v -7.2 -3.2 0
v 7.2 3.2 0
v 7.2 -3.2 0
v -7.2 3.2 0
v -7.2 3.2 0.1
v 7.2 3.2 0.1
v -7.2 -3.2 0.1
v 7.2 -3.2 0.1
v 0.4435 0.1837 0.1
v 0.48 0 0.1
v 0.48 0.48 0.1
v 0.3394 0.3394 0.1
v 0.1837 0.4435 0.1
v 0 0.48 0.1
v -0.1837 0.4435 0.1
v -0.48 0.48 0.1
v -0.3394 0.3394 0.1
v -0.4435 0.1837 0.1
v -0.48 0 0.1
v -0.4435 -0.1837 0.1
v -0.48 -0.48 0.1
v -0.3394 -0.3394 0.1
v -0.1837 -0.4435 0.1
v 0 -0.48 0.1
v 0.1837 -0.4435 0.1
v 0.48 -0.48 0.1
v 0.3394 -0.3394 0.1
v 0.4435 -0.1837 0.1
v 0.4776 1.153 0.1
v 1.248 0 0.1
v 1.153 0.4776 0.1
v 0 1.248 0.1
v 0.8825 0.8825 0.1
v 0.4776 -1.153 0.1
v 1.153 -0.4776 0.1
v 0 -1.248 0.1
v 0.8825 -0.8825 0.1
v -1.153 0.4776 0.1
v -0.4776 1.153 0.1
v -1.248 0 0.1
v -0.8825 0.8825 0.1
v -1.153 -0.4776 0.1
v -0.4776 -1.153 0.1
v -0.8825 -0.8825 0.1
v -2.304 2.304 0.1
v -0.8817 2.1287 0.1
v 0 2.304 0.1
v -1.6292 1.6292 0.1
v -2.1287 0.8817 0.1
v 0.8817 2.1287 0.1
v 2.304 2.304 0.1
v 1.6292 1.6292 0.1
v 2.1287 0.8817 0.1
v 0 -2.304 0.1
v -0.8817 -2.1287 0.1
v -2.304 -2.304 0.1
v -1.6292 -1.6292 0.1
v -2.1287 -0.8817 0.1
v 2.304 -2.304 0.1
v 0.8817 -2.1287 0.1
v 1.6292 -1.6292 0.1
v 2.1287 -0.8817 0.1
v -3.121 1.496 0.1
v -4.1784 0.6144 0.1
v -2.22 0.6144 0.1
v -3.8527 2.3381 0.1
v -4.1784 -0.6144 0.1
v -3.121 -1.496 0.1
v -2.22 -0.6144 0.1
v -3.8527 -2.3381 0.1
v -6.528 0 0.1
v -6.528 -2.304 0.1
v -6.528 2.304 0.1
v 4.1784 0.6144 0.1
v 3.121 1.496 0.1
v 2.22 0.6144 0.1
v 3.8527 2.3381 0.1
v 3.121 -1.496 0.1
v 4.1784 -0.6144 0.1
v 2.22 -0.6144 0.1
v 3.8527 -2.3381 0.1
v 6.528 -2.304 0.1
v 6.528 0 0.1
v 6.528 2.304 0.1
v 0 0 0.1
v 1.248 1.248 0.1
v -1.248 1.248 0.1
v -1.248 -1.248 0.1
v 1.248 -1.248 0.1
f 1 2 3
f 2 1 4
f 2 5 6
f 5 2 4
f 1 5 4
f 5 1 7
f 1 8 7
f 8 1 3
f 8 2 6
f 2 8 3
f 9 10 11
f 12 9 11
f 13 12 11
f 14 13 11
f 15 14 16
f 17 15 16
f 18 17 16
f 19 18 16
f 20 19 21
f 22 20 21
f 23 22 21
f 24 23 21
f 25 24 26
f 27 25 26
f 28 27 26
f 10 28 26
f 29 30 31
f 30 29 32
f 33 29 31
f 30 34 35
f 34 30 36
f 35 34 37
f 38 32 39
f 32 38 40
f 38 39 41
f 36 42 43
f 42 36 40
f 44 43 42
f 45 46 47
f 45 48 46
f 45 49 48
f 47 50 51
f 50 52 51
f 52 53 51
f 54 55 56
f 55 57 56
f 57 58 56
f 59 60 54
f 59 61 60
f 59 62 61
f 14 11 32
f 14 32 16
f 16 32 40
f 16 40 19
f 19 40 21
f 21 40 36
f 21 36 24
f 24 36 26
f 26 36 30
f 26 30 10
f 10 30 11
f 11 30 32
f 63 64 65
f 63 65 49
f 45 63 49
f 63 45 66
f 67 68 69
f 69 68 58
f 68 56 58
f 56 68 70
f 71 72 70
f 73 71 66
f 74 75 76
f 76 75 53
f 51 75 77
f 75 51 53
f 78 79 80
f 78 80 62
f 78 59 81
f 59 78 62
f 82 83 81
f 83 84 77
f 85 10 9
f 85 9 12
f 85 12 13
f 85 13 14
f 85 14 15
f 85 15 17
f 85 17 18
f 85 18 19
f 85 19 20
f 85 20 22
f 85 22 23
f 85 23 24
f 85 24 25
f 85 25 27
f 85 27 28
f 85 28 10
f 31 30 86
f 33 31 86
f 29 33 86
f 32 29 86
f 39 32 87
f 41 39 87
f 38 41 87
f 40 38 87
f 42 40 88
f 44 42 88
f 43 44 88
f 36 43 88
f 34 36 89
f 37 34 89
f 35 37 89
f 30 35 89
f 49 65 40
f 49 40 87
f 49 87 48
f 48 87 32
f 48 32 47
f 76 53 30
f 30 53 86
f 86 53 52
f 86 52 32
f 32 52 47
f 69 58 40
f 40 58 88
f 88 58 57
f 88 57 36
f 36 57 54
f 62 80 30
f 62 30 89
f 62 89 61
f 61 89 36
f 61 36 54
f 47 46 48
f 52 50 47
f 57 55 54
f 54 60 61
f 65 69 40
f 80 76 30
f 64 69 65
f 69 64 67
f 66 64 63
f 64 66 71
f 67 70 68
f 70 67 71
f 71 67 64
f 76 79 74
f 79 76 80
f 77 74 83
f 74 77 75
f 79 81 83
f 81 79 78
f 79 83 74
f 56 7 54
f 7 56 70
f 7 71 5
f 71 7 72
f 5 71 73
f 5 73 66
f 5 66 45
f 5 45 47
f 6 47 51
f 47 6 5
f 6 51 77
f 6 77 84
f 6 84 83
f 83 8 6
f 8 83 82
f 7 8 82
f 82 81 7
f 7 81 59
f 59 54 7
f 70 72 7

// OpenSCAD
// file: ../p/4-4disc.scad
use <../lib.scad>
function ldraw_lib__4_4disc() = [
// 0 Disc 1.0
// 0 Name: 4-4disc.dat
// 0 Author: James Jessiman
// 0 !LDRAW_ORG Primitive UPDATE 2002-02
// 0 !LICENSE Licensed under CC BY 4.0 : see CAreadme.txt
// 
// 0 BFC CERTIFY CCW
  [0,"BFC","CERTIFY"],
  [0,"BFC","CCW"],
// 
// 0 !HISTORY 1998-12-15 [PTadmin] Official Update 1998-10
// 0 !HISTORY 2002-03-23 [sbliss] Added BFC statement
// 0 !HISTORY 2002-04-25 [PTadmin] Official Update 2002-02
// 0 !HISTORY 2007-06-24 [PTadmin] Header formatted for Contributor Agreement
// 0 !HISTORY 2008-07-01 [PTadmin] Official Update 2008-01
// 
// 
// 3 16 0 0 0 1 0 0 0.9239 0 0.3827
  [3,16,0,0,0,1,0,0,0.9239,0,0.3827],
// 3 16 0 0 0 0.9239 0 0.3827 0.7071 0 0.7071
  [3,16,0,0,0,0.9239,0,0.3827,0.7071,0,0.7071],
// 3 16 0 0 0 0.7071 0 0.7071 0.3827 0 0.9239
  [3,16,0,0,0,0.7071,0,0.7071,0.3827,0,0.9239],
// 3 16 0 0 0 0.3827 0 0.9239 0 0 1
  [3,16,0,0,0,0.3827,0,0.9239,0,0,1],
// 3 16 0 0 0 0 0 1 -0.3827 0 0.9239
  [3,16,0,0,0,0,0,1,-0.3827,0,0.9239],
// 3 16 0 0 0 -0.3827 0 0.9239 -0.7071 0 0.7071
  [3,16,0,0,0,-0.3827,0,0.9239,-0.7071,0,0.7071],
// 3 16 0 0 0 -0.7071 0 0.7071 -0.9239 0 0.3827
  [3,16,0,0,0,-0.7071,0,0.7071,-0.9239,0,0.3827],
// 3 16 0 0 0 -0.9239 0 0.3827 -1 0 -0
  [3,16,0,0,0,-0.9239,0,0.3827,-1,0,-0],
// 3 16 0 0 0 -1 0 -0 -0.9239 0 -0.3827
  [3,16,0,0,0,-1,0,-0,-0.9239,0,-0.3827],
// 3 16 0 0 0 -0.9239 0 -0.3827 -0.7071 0 -0.7071
  [3,16,0,0,0,-0.9239,0,-0.3827,-0.7071,0,-0.7071],
// 3 16 0 0 0 -0.7071 0 -0.7071 -0.3827 0 -0.9239
  [3,16,0,0,0,-0.7071,0,-0.7071,-0.3827,0,-0.9239],
// 3 16 0 0 0 -0.3827 0 -0.9239 0 0 -1
  [3,16,0,0,0,-0.3827,0,-0.9239,0,0,-1],
// 3 16 0 0 0 0 0 -1 0.3827 0 -0.9239
  [3,16,0,0,0,0,0,-1,0.3827,0,-0.9239],
// 3 16 0 0 0 0.3827 0 -0.9239 0.7071 0 -0.7071
  [3,16,0,0,0,0.3827,0,-0.9239,0.7071,0,-0.7071],
// 3 16 0 0 0 0.7071 0 -0.7071 0.9239 0 -0.3827
  [3,16,0,0,0,0.7071,0,-0.7071,0.9239,0,-0.3827],
// 3 16 0 0 0 0.9239 0 -0.3827 1 0 0
  [3,16,0,0,0,0.9239,0,-0.3827,1,0,0],
// 0
];
module ldraw_lib__4_4disc(step=0, col=false, unit=2/5, alt=false, line=0.2, solid=!$preview)
    makepoly(ldraw_lib__4_4disc(), step=step, col=col, unit=unit, alt=alt, line=line, solid=solid);
ldraw_lib__4_4disc(line=0.2);
// file: ../p/1-8chrd.scad
use <../lib.scad>
function ldraw_lib__1_8chrd() = [
// 0 Chord 0.125
// 0 Name: 1-8chrd.dat
// 0 Author: Orion Pobursky [OrionP]
// 0 !LDRAW_ORG Primitive UPDATE 2023-05
// 0 !LICENSE Licensed under CC BY 4.0 : see CAreadme.txt
// 
// 0 BFC CERTIFY CCW
  [0,"BFC","CERTIFY"],
  [0,"BFC","CCW"],
// 
// 0 !HISTORY 2004-04-22 [PTadmin] Official Update 2004-02
// 0 !HISTORY 2007-06-22 [PTadmin] Header formatted for Contributor Agreement
// 0 !HISTORY 2008-07-01 [PTadmin] Official Update 2008-01
// 0 !HISTORY 2023-10-27 [OrionP] Rebuilt with PrimGen2, original author westrate
// 0 !HISTORY 2023-10-31 [OrionP] Official Update 2023-05
// 
// 3 16 1 0 0 0.9239 0 0.3827 0.7071 0 0.7071
  [3,16,1,0,0,0.9239,0,0.3827,0.7071,0,0.7071],
];
module ldraw_lib__1_8chrd(step=0, col=false, unit=2/5, alt=false, line=0.2, solid=!$preview)
    makepoly(ldraw_lib__1_8chrd(), step=step, col=col, unit=unit, alt=alt, line=line, solid=solid);
ldraw_lib__1_8chrd(line=0.2);
// file: ../p/4-4ndis.scad
use <../lib.scad>
function ldraw_lib__4_4ndis() = [
// 0 Disc Negative 1.0
// 0 Name: 4-4ndis.dat
// 0 Author: James Jessiman
// 0 !LDRAW_ORG Primitive UPDATE 2012-01
// 0 !LICENSE Licensed under CC BY 4.0 : see CAreadme.txt
// 
// 0 BFC CERTIFY CCW
  [0,"BFC","CERTIFY"],
  [0,"BFC","CCW"],
// 
// 0 !HISTORY 2002-03-23 [sbliss] Added BFC statement; compacted code
// 0 !HISTORY 2002-04-25 [PTadmin] Official Update 2002-02
// 0 !HISTORY 2007-06-24 [PTadmin] Header formatted for Contributor Agreement
// 0 !HISTORY 2008-07-01 [PTadmin] Official Update 2008-01
// 0 !HISTORY 2012-02-16 [Philo] Changed to CCW
// 0 !HISTORY 2012-03-30 [PTadmin] Official Update 2012-01
// 
// 
// 3 16 0.9239 0 0.3827 1 0 0 1 0 1
  [3,16,0.9239,0,0.3827,1,0,0,1,0,1],
// 3 16 0.7071 0 0.7071 0.9239 0 0.3827 1 0 1
  [3,16,0.7071,0,0.7071,0.9239,0,0.3827,1,0,1],
// 3 16 0.3827 0 0.9239 0.7071 0 0.7071 1 0 1
  [3,16,0.3827,0,0.9239,0.7071,0,0.7071,1,0,1],
// 3 16 0 0 1 0.3827 0 0.9239 1 0 1
  [3,16,0,0,1,0.3827,0,0.9239,1,0,1],
// 3 16 -0.3827 0 0.9239 0 0 1 -1 0 1
  [3,16,-0.3827,0,0.9239,0,0,1,-1,0,1],
// 3 16 -0.7071 0 0.7071 -0.3827 0 0.9239 -1 0 1
  [3,16,-0.7071,0,0.7071,-0.3827,0,0.9239,-1,0,1],
// 3 16 -0.9239 0 0.3827 -0.7071 0 0.7071 -1 0 1
  [3,16,-0.9239,0,0.3827,-0.7071,0,0.7071,-1,0,1],
// 3 16 -1 0 0 -0.9239 0 0.3827 -1 0 1
  [3,16,-1,0,0,-0.9239,0,0.3827,-1,0,1],
// 3 16 -0.9239 0 -0.3827 -1 0 0 -1 0 -1
  [3,16,-0.9239,0,-0.3827,-1,0,0,-1,0,-1],
// 3 16 -0.7071 0 -0.7071 -0.9239 0 -0.3827 -1 0 -1
  [3,16,-0.7071,0,-0.7071,-0.9239,0,-0.3827,-1,0,-1],
// 3 16 -0.3827 0 -0.9239 -0.7071 0 -0.7071 -1 0 -1
  [3,16,-0.3827,0,-0.9239,-0.7071,0,-0.7071,-1,0,-1],
// 3 16 0 0 -1 -0.3827 0 -0.9239 -1 0 -1
  [3,16,0,0,-1,-0.3827,0,-0.9239,-1,0,-1],
// 3 16 0.3827 0 -0.9239 0 0 -1 1 0 -1
  [3,16,0.3827,0,-0.9239,0,0,-1,1,0,-1],
// 3 16 0.7071 0 -0.7071 0.3827 0 -0.9239 1 0 -1
  [3,16,0.7071,0,-0.7071,0.3827,0,-0.9239,1,0,-1],
// 3 16 0.9239 0 -0.3827 0.7071 0 -0.7071 1 0 -1
  [3,16,0.9239,0,-0.3827,0.7071,0,-0.7071,1,0,-1],
// 3 16 1 0 0 0.9239 0 -0.3827 1 0 -1
  [3,16,1,0,0,0.9239,0,-0.3827,1,0,-1],
];
module ldraw_lib__4_4ndis(step=0, col=false, unit=2/5, alt=false, line=0.2, solid=!$preview)
    makepoly(ldraw_lib__4_4ndis(), step=step, col=col, unit=unit, alt=alt, line=line, solid=solid);
ldraw_lib__4_4ndis(line=0.2);
// file: ../p/3-16ndis.scad
use <../lib.scad>
function ldraw_lib__3_16ndis() = [
// 0 Disc Negative 0.1875
// 0 Name: 3-16ndis.dat
// 0 Author: Guy Vivan [guyvivan]
// 0 !LDRAW_ORG Primitive UPDATE 2009-01
// 0 !LICENSE Licensed under CC BY 2.0 and CC BY 4.0 : see CAreadme.txt
// 
// 0 BFC CERTIFY CCW
  [0,"BFC","CERTIFY"],
  [0,"BFC","CCW"],
// 
// 0 !HISTORY 2009-05-02 [PTadmin] Official Update 2009-01
// 
// 
// 3 16 1 0 1 0.9239 0 0.3827 1 0 0
  [3,16,1,0,1,0.9239,0,0.3827,1,0,0],
// 3 16 1 0 1 0.7071 0 0.7071 0.9239 0 0.3827
  [3,16,1,0,1,0.7071,0,0.7071,0.9239,0,0.3827],
// 3 16 1 0 1 0.3827 0 0.9239 0.7071 0 0.7071
  [3,16,1,0,1,0.3827,0,0.9239,0.7071,0,0.7071],
// 
// 0 end of file
// 
];
module ldraw_lib__3_16ndis(step=0, col=false, unit=2/5, alt=false, line=0.2, solid=!$preview)
    makepoly(ldraw_lib__3_16ndis(), step=step, col=col, unit=unit, alt=alt, line=line, solid=solid);
ldraw_lib__3_16ndis(line=0.2);
// file: ../p/1-4chrd.scad
use <../lib.scad>
function ldraw_lib__1_4chrd() = [
// 0 Chord 0.25
// 0 Name: 1-4chrd.dat
// 0 Author: Max Martin Richter [MMR1988]
// 0 !LDRAW_ORG Primitive UPDATE 2023-05
// 0 !LICENSE Licensed under CC BY 4.0 : see CAreadme.txt
// 
// 0 BFC CERTIFY CCW
  [0,"BFC","CERTIFY"],
  [0,"BFC","CCW"],
// 
// 0 !HISTORY 2004-04-22 [PTadmin] Official Update 2004-02
// 0 !HISTORY 2007-10-09 [PTadmin] Header formatted for Contributor Agreement
// 0 !HISTORY 2008-07-01 [PTadmin] Official Update 2008-01
// 0 !HISTORY 2012-08-02 [MMR1988] Re-creation with PrimGen2 and Rectifier
// 0 !HISTORY 2012-08-09 [PTadmin] Official Update 2012-02
// 0 !HISTORY 2023-10-27 [OrionP] Change author to MMR1988 from hafhead
// 0 !HISTORY 2023-10-31 [OrionP] Official Update 2023-05
// 
// 4 16 0.9239 0 0.3827 0.3827 0 0.9239 0 0 1 1 0 0
  [4,16,0.9239,0,0.3827,0.3827,0,0.9239,0,0,1,1,0,0],
// 3 16 0.7071 0 0.7071 0.3827 0 0.9239 0.9239 0 0.3827
  [3,16,0.7071,0,0.7071,0.3827,0,0.9239,0.9239,0,0.3827],
];
module ldraw_lib__1_4chrd(step=0, col=false, unit=2/5, alt=false, line=0.2, solid=!$preview)
    makepoly(ldraw_lib__1_4chrd(), step=step, col=col, unit=unit, alt=alt, line=line, solid=solid);
ldraw_lib__1_4chrd(line=0.2);
// file: ../p/logo-train-2006-bold.scad
use <../lib.scad>
use <1-8chrd.scad>
use <4-4disc.scad>
use <4-4ndis.scad>
function ldraw_lib__logo_train_2006_bold() = [
// 0 Logo Train 2006 Bold
// 0 Name: logo-train-2006-bold.dat
// 0 Author: Gerald Lasser [GeraldLasser]
// 0 !LDRAW_ORG Primitive UPDATE 2023-07
// 0 !LICENSE Licensed under CC BY 4.0 : see CAreadme.txt
// 
// 0 BFC CERTIFY CCW
  [0,"BFC","CERTIFY"],
  [0,"BFC","CCW"],
// 
// 0 !HISTORY 2023-12-31 [OrionP] Official Update 2023-07
// 
// 
// 1 16 0 -.25 0 2.5 0 0 0 1 0 0 0 2.5 4-4disc.dat
  [1,16,0,-.25,0,2.5,0,0,0,1,0,0,0,2.5, ldraw_lib__4_4disc()],
// 1 16 0 -.25 0 6.5 0 0 0 1 0 0 0 6.5 4-4ndis.dat
  [1,16,0,-.25,0,6.5,0,0,0,1,0,0,0,6.5, ldraw_lib__4_4ndis()],
// 
// 3 16 -11.0868 -.25 4.5924 -11.5625 -.25 3.2 -6.5 -.25 0
  [3,16,-11.0868,-.25,4.5924,-11.5625,-.25,3.2,-6.5,-.25,0],
// 3 16 -11.0868 -.25 4.5924 -6.5 -.25 0 -6.5 -.25 6.5
  [3,16,-11.0868,-.25,4.5924,-6.5,-.25,0,-6.5,-.25,6.5],
// 3 16 -11.0868 -.25 4.5924 -6.5 -.25 6.5 -8.4852 -.25 8.4852
  [3,16,-11.0868,-.25,4.5924,-6.5,-.25,6.5,-8.4852,-.25,8.4852],
// 3 16 -8.4852 -.25 8.4852 -6.5 -.25 6.5 0 -.25 6.5
  [3,16,-8.4852,-.25,8.4852,-6.5,-.25,6.5,0,-.25,6.5],
// 3 16 -8.4852 -.25 8.4852 0 -.25 6.5 0 -.25 12
  [3,16,-8.4852,-.25,8.4852,0,-.25,6.5,0,-.25,12],
// 3 16 11.5625 -.25 3.2 11.0868 -.25 4.5924 6.5 -.25 0
  [3,16,11.5625,-.25,3.2,11.0868,-.25,4.5924,6.5,-.25,0],
// 3 16 6.5 -.25 0 11.0868 -.25 4.5924 6.5 -.25 6.5
  [3,16,6.5,-.25,0,11.0868,-.25,4.5924,6.5,-.25,6.5],
// 3 16 6.5 -.25 6.5 11.0868 -.25 4.5924 8.4852 -.25 8.4852
  [3,16,6.5,-.25,6.5,11.0868,-.25,4.5924,8.4852,-.25,8.4852],
// 3 16 6.5 -.25 6.5 8.4852 -.25 8.4852 0 -.25 6.5
  [3,16,6.5,-.25,6.5,8.4852,-.25,8.4852,0,-.25,6.5],
// 3 16 0 -.25 6.5 8.4852 -.25 8.4852 0 -.25 12
  [3,16,0,-.25,6.5,8.4852,-.25,8.4852,0,-.25,12],
// 3 16 -11.5625 -.25 -3.2 -11.0868 -.25 -4.5924 -6.5 -.25 0
  [3,16,-11.5625,-.25,-3.2,-11.0868,-.25,-4.5924,-6.5,-.25,0],
// 3 16 -6.5 -.25 0 -11.0868 -.25 -4.5924 -6.5 -.25 -6.5
  [3,16,-6.5,-.25,0,-11.0868,-.25,-4.5924,-6.5,-.25,-6.5],
// 3 16 -6.5 -.25 -6.5 -11.0868 -.25 -4.5924 -8.4852 -.25 -8.4852
  [3,16,-6.5,-.25,-6.5,-11.0868,-.25,-4.5924,-8.4852,-.25,-8.4852],
// 3 16 -6.5 -.25 -6.5 -8.4852 -.25 -8.4852 0 -.25 -6.5
  [3,16,-6.5,-.25,-6.5,-8.4852,-.25,-8.4852,0,-.25,-6.5],
// 3 16 0 -.25 -6.5 -8.4852 -.25 -8.4852 0 -.25 -12
  [3,16,0,-.25,-6.5,-8.4852,-.25,-8.4852,0,-.25,-12],
// 3 16 11.0868 -.25 -4.5924 11.5625 -.25 -3.2 6.5 -.25 0
  [3,16,11.0868,-.25,-4.5924,11.5625,-.25,-3.2,6.5,-.25,0],
// 3 16 11.0868 -.25 -4.5924 6.5 -.25 0 6.5 -.25 -6.5
  [3,16,11.0868,-.25,-4.5924,6.5,-.25,0,6.5,-.25,-6.5],
// 3 16 11.0868 -.25 -4.5924 6.5 -.25 -6.5 8.4852 -.25 -8.4852
  [3,16,11.0868,-.25,-4.5924,6.5,-.25,-6.5,8.4852,-.25,-8.4852],
// 3 16 8.4852 -.25 -8.4852 6.5 -.25 -6.5 0 -.25 -6.5
  [3,16,8.4852,-.25,-8.4852,6.5,-.25,-6.5,0,-.25,-6.5],
// 3 16 8.4852 -.25 -8.4852 0 -.25 -6.5 0 -.25 -12
  [3,16,8.4852,-.25,-8.4852,0,-.25,-6.5,0,-.25,-12],
// 1 16 0 -.25 0 0 0 -12 0 1 0 12 0 0 1-8chrd.dat
  [1,16,0,-.25,0,0,0,-12,0,1,0,12,0,0, ldraw_lib__1_8chrd()],
// 1 16 0 -.25 0 0 0 12 0 1 0 12 0 0 1-8chrd.dat
  [1,16,0,-.25,0,0,0,12,0,1,0,12,0,0, ldraw_lib__1_8chrd()],
// 1 16 0 -.25 0 0 0 -12 0 1 0 -12 0 0 1-8chrd.dat
  [1,16,0,-.25,0,0,0,-12,0,1,0,-12,0,0, ldraw_lib__1_8chrd()],
// 1 16 0 -.25 0 0 0 12 0 1 0 -12 0 0 1-8chrd.dat
  [1,16,0,-.25,0,0,0,12,0,1,0,-12,0,0, ldraw_lib__1_8chrd()],
// 3 16 -11.5625 -.25 3.2 -11.5625 -.25 -3.2 -6.5 -.25 0
  [3,16,-11.5625,-.25,3.2,-11.5625,-.25,-3.2,-6.5,-.25,0],
// 3 16 11.5625 -.25 -3.2 11.5625 -.25 3.2 6.5 -.25 0
  [3,16,11.5625,-.25,-3.2,11.5625,-.25,3.2,6.5,-.25,0],
// 4 16 -21.7625 -.25 3.2 -21.7625 -.25 -3.2 -11.5625 -.25 -3.2 -11.5625 -.25 3.2
  [4,16,-21.7625,-.25,3.2,-21.7625,-.25,-3.2,-11.5625,-.25,-3.2,-11.5625,-.25,3.2],
// 4 16 -34 -.25 0 -21.7625 -.25 3.2 -16.255 -.25 7.7915 -20.0662 -.25 12.1778
  [4,16,-34,-.25,0,-21.7625,-.25,3.2,-16.255,-.25,7.7915,-20.0662,-.25,12.1778],
// 4 16 -16.255 -.25 -7.7915 -21.7625 -.25 -3.2 -34 -.25 0 -20.0662 -.25 -12.1778
  [4,16,-16.255,-.25,-7.7915,-21.7625,-.25,-3.2,-34,-.25,0,-20.0662,-.25,-12.1778],
// 3 16 -34 -.25 0 -21.7625 -.25 -3.2 -21.7625 -.25 3.2
  [3,16,-34,-.25,0,-21.7625,-.25,-3.2,-21.7625,-.25,3.2],
// 4 16 11.5625 -.25 -3.2 21.7625 -.25 -3.2 21.7625 -.25 3.2 11.5625 -.25 3.2
  [4,16,11.5625,-.25,-3.2,21.7625,-.25,-3.2,21.7625,-.25,3.2,11.5625,-.25,3.2],
// 4 16 16.255 -.25 7.7915 21.7625 -.25 3.2 34 -.25 0 20.0662 -.25 12.1778
  [4,16,16.255,-.25,7.7915,21.7625,-.25,3.2,34,-.25,0,20.0662,-.25,12.1778],
// 4 16 34 -.25 0 21.7625 -.25 -3.2 16.255 -.25 -7.7915 20.0662 -.25 -12.1778
  [4,16,34,-.25,0,21.7625,-.25,-3.2,16.255,-.25,-7.7915,20.0662,-.25,-12.1778],
// 3 16 21.7625 -.25 -3.2 34 -.25 0 21.7625 -.25 3.2
  [3,16,21.7625,-.25,-3.2,34,-.25,0,21.7625,-.25,3.2],
];
module ldraw_lib__logo_train_2006_bold(step=0, col=false, unit=2/5, alt=false, line=0.2, solid=!$preview)
    makepoly(ldraw_lib__logo_train_2006_bold(), step=step, col=col, unit=unit, alt=alt, line=line, solid=solid);
ldraw_lib__logo_train_2006_bold(line=0.2);
// file: ../p/logo-train-2006-bold-box.scad
use <../lib.scad>
use <1-4chrd.scad>
use <3-16ndis.scad>
use <4-4ndis.scad>
function ldraw_lib__logo_train_2006_bold_box() = [
// 0 Logo Train 2006 Bold Outer Box
// 0 Name: logo-train-2006-bold-box.dat
// 0 Author: Gerald Lasser [GeraldLasser]
// 0 !LDRAW_ORG Primitive UPDATE 2023-07
// 0 !LICENSE Licensed under CC BY 4.0 : see CAreadme.txt
// 
// 0 BFC CERTIFY CCW
  [0,"BFC","CERTIFY"],
  [0,"BFC","CCW"],
// 
// 0 !HISTORY 2023-12-31 [OrionP] Official Update 2023-07
// 
// 
// 1 16 0 -.25 0 2.5 0 0 0 1 0 0 0 2.5 4-4ndis.dat
  [1,16,0,-.25,0,2.5,0,0,0,1,0,0,0,2.5, ldraw_lib__4_4ndis()],
// 1 16 0 -.25 0 6.5 0 0 0 1 0 0 0 6.5 1-4chrd.dat
  [1,16,0,-.25,0,6.5,0,0,0,1,0,0,0,6.5, ldraw_lib__1_4chrd()],
// 1 16 0 -.25 0 6.5 0 0 0 1 0 0 0 -6.5 1-4chrd.dat
  [1,16,0,-.25,0,6.5,0,0,0,1,0,0,0,-6.5, ldraw_lib__1_4chrd()],
// 1 16 0 -.25 0 -6.5 0 0 0 1 0 0 0 6.5 1-4chrd.dat
  [1,16,0,-.25,0,-6.5,0,0,0,1,0,0,0,6.5, ldraw_lib__1_4chrd()],
// 1 16 0 -.25 0 -6.5 0 0 0 1 0 0 0 -6.5 1-4chrd.dat
  [1,16,0,-.25,0,-6.5,0,0,0,1,0,0,0,-6.5, ldraw_lib__1_4chrd()],
// 1 16 0 -.25 0 0 0 -12 0 1 0 12 0 0 3-16ndis.dat
  [1,16,0,-.25,0,0,0,-12,0,1,0,12,0,0, ldraw_lib__3_16ndis()],
// 1 16 0 -.25 0 0 0 12 0 1 0 12 0 0 3-16ndis.dat
  [1,16,0,-.25,0,0,0,12,0,1,0,12,0,0, ldraw_lib__3_16ndis()],
// 1 16 0 -.25 0 0 0 -12 0 1 0 -12 0 0 3-16ndis.dat
  [1,16,0,-.25,0,0,0,-12,0,1,0,-12,0,0, ldraw_lib__3_16ndis()],
// 1 16 0 -.25 0 0 0 12 0 1 0 -12 0 0 3-16ndis.dat
  [1,16,0,-.25,0,0,0,12,0,1,0,-12,0,0, ldraw_lib__3_16ndis()],
// 3 16 0 -.25 2.5 2.5 -.25 2.5 0 -.25 6.5
  [3,16,0,-.25,2.5,2.5,-.25,2.5,0,-.25,6.5],
// 3 16 0 -.25 2.5 0 -.25 6.5 -2.5 -.25 2.5
  [3,16,0,-.25,2.5,0,-.25,6.5,-2.5,-.25,2.5],
// 3 16 -2.5 -.25 2.5 0 -.25 6.5 -6.5 -.25 0
  [3,16,-2.5,-.25,2.5,0,-.25,6.5,-6.5,-.25,0],
// 3 16 -2.5 -.25 2.5 -6.5 -.25 0 -2.5 -.25 0
  [3,16,-2.5,-.25,2.5,-6.5,-.25,0,-2.5,-.25,0],
// 3 16 -2.5 -.25 0 -6.5 -.25 0 -2.5 -.25 -2.5
  [3,16,-2.5,-.25,0,-6.5,-.25,0,-2.5,-.25,-2.5],
// 3 16 -2.5 -.25 -2.5 -6.5 -.25 0 0 -.25 -6.5
  [3,16,-2.5,-.25,-2.5,-6.5,-.25,0,0,-.25,-6.5],
// 3 16 -2.5 -.25 -2.5 0 -.25 -6.5 0 -.25 -2.5
  [3,16,-2.5,-.25,-2.5,0,-.25,-6.5,0,-.25,-2.5],
// 3 16 0 -.25 -2.5 0 -.25 -6.5 2.5 -.25 -2.5
  [3,16,0,-.25,-2.5,0,-.25,-6.5,2.5,-.25,-2.5],
// 3 16 2.5 -.25 -2.5 0 -.25 -6.5 6.5 -.25 0
  [3,16,2.5,-.25,-2.5,0,-.25,-6.5,6.5,-.25,0],
// 3 16 2.5 -.25 -2.5 6.5 -.25 0 2.5 -.25 0
  [3,16,2.5,-.25,-2.5,6.5,-.25,0,2.5,-.25,0],
// 3 16 2.5 -.25 0 6.5 -.25 0 2.5 -.25 2.5
  [3,16,2.5,-.25,0,6.5,-.25,0,2.5,-.25,2.5],
// 3 16 2.5 -.25 2.5 6.5 -.25 0 0 -.25 6.5
  [3,16,2.5,-.25,2.5,6.5,-.25,0,0,-.25,6.5],
// 
// 3 16 -16.255 -.25 7.7915 -21.7625 -.25 3.2 -11.5625 -.25 3.2
  [3,16,-16.255,-.25,7.7915,-21.7625,-.25,3.2,-11.5625,-.25,3.2],
// 3 16 -16.255 -.25 7.7915 -11.5625 -.25 3.2 -11.0868 -.25 4.5924
  [3,16,-16.255,-.25,7.7915,-11.5625,-.25,3.2,-11.0868,-.25,4.5924],
// 4 16 -12 -.25 12 -20.0662 -.25 12.1778 -16.255 -.25 7.7915 -11.0868 -.25 4.5924
  [4,16,-12,-.25,12,-20.0662,-.25,12.1778,-16.255,-.25,7.7915,-11.0868,-.25,4.5924],
// 3 16 -21.7625 -.25 -3.2 -16.255 -.25 -7.7915 -11.5625 -.25 -3.2
  [3,16,-21.7625,-.25,-3.2,-16.255,-.25,-7.7915,-11.5625,-.25,-3.2],
// 3 16 -11.5625 -.25 -3.2 -16.255 -.25 -7.7915 -11.0868 -.25 -4.5924
  [3,16,-11.5625,-.25,-3.2,-16.255,-.25,-7.7915,-11.0868,-.25,-4.5924],
// 4 16 -16.255 -.25 -7.7915 -20.0662 -.25 -12.1778 -12 -.25 -12 -11.0868 -.25 -4.5924
  [4,16,-16.255,-.25,-7.7915,-20.0662,-.25,-12.1778,-12,-.25,-12,-11.0868,-.25,-4.5924],
// 3 16 -34 -.25 0 -34 -.25 -12 -20.0662 -.25 -12.1778
  [3,16,-34,-.25,0,-34,-.25,-12,-20.0662,-.25,-12.1778],
// 3 16 -34 -.25 12 -34 -.25 0 -20.0662 -.25 12.1778
  [3,16,-34,-.25,12,-34,-.25,0,-20.0662,-.25,12.1778],
// 3 16 21.7625 -.25 3.2 16.255 -.25 7.7915 11.5625 -.25 3.2
  [3,16,21.7625,-.25,3.2,16.255,-.25,7.7915,11.5625,-.25,3.2],
// 3 16 11.5625 -.25 3.2 16.255 -.25 7.7915 11.0868 -.25 4.5924
  [3,16,11.5625,-.25,3.2,16.255,-.25,7.7915,11.0868,-.25,4.5924],
// 4 16 16.255 -.25 7.7915 20.0662 -.25 12.1778 12 -.25 12 11.0868 -.25 4.5924
  [4,16,16.255,-.25,7.7915,20.0662,-.25,12.1778,12,-.25,12,11.0868,-.25,4.5924],
// 3 16 16.255 -.25 -7.7915 21.7625 -.25 -3.2 11.5625 -.25 -3.2
  [3,16,16.255,-.25,-7.7915,21.7625,-.25,-3.2,11.5625,-.25,-3.2],
// 3 16 16.255 -.25 -7.7915 11.5625 -.25 -3.2 11.0868 -.25 -4.5924
  [3,16,16.255,-.25,-7.7915,11.5625,-.25,-3.2,11.0868,-.25,-4.5924],
// 4 16 12 -.25 -12 20.0662 -.25 -12.1778 16.255 -.25 -7.7915 11.0868 -.25 -4.5924
  [4,16,12,-.25,-12,20.0662,-.25,-12.1778,16.255,-.25,-7.7915,11.0868,-.25,-4.5924],
// 3 16 34 -.25 -12 34 -.25 0 20.0662 -.25 -12.1778
  [3,16,34,-.25,-12,34,-.25,0,20.0662,-.25,-12.1778],
// 3 16 34 -.25 0 34 -.25 12 20.0662 -.25 12.1778
  [3,16,34,-.25,0,34,-.25,12,20.0662,-.25,12.1778],
];
module ldraw_lib__logo_train_2006_bold_box(step=0, col=false, unit=2/5, alt=false, line=0.2, solid=!$preview)
    makepoly(ldraw_lib__logo_train_2006_bold_box(), step=step, col=col, unit=unit, alt=alt, line=line, solid=solid);
ldraw_lib__logo_train_2006_bold_box(line=0.2);
// file: ../p/box5-12.scad
use <../lib.scad>
function ldraw_lib__box5_12() = [
// 0 Box with 5 Faces without Any Edges
// 0 Name: box5-12.dat
// 0 Author: Chris Dee [cwdee]
// 0 !LDRAW_ORG Primitive UPDATE 2009-02
// 0 !LICENSE Licensed under CC BY 4.0 : see CAreadme.txt
// 
// 0 BFC CERTIFY CCW
  [0,"BFC","CERTIFY"],
  [0,"BFC","CCW"],
// 
// 0 !HISTORY 2009-09-03 [PTadmin] Official Update 2009-02
// 
// 
// 4 16 1 1 1 1 1 -1 -1 1 -1 -1 1 1
  [4,16,1,1,1,1,1,-1,-1,1,-1,-1,1,1],
// 4 16 -1 0 1 1 0 1 1 1 1 -1 1 1
  [4,16,-1,0,1,1,0,1,1,1,1,-1,1,1],
// 4 16 -1 0 -1 -1 0 1 -1 1 1 -1 1 -1
  [4,16,-1,0,-1,-1,0,1,-1,1,1,-1,1,-1],
// 4 16 1 0 -1 -1 0 -1 -1 1 -1 1 1 -1
  [4,16,1,0,-1,-1,0,-1,-1,1,-1,1,1,-1],
// 4 16 1 0 1 1 0 -1 1 1 -1 1 1 1
  [4,16,1,0,1,1,0,-1,1,1,-1,1,1,1],
// 0
];
module ldraw_lib__box5_12(step=0, col=false, unit=2/5, alt=false, line=0.2, solid=!$preview)
    makepoly(ldraw_lib__box5_12(), step=step, col=col, unit=unit, alt=alt, line=line, solid=solid);
ldraw_lib__box5_12(line=0.2);
// main file
use <../lib.scad>
use <../p/box5-12.scad>
use <../p/logo-train-2006-bold-box.scad>
use <../p/logo-train-2006-bold.scad>
function ldraw_lib__4638848c() = [
// 0 Sticker  0.8 x  1.8 with White Train Logo (2006, Bold) on Red Background
// 0 Name: 4638848c.dat
// 0 Author: Gerald Lasser [GeraldLasser]
// 0 !LDRAW_ORG Part UPDATE 2023-07
// 0 !LICENSE Licensed under CC BY 4.0 : see CAreadme.txt
// 
// 0 BFC CERTIFY CCW
  [0,"BFC","CERTIFY"],
  [0,"BFC","CCW"],
// 
// 0 !KEYWORDS Set 3677
// 
// 0 !HISTORY 2023-12-31 [OrionP] Official Update 2023-07
// 
// 
// 1 16 0 -.25 0 18 0 0 0 .25 0 0 0 8 box5-12.dat
  [1,16,0,-.25,0,18,0,0,0,.25,0,0,0,8, ldraw_lib__box5_12()],
// 
// 1 4 0 0 0 0.48 0 0 0 1 0 0 0 0.48 logo-train-2006-bold-box.dat
  [1,4,0,0,0,0.48,0,0,0,1,0,0,0,0.48, ldraw_lib__logo_train_2006_bold_box()],
// 1 15 0 0 0 0.48 0 0 0 1 0 0 0 0.48 logo-train-2006-bold.dat
  [1,15,0,0,0,0.48,0,0,0,1,0,0,0,0.48, ldraw_lib__logo_train_2006_bold()],
// 
// 3 4 -5.76 -.25 -5.76 -18 -.25 -8 0 -.25 -5.76
  [3,4,-5.76,-.25,-5.76,-18,-.25,-8,0,-.25,-5.76],
// 3 4 -18 -.25 -8 -5.76 -.25 -5.76 -9.631776 -.25 -5.845344
  [3,4,-18,-.25,-8,-5.76,-.25,-5.76,-9.631776,-.25,-5.845344],
// 4 4 -18 -.25 -8 -16.32 -.25 -5.76 -16.32 -.25 0 -18 -.25 8
  [4,4,-18,-.25,-8,-16.32,-.25,-5.76,-16.32,-.25,0,-18,-.25,8],
// 3 4 -18 -.25 8 -16.32 -.25 0 -16.32 -.25 5.76
  [3,4,-18,-.25,8,-16.32,-.25,0,-16.32,-.25,5.76],
// 3 4 -18 -.25 8 -16.32 -.25 5.76 -9.631776 -.25 5.845344
  [3,4,-18,-.25,8,-16.32,-.25,5.76,-9.631776,-.25,5.845344],
// 3 4 -18 -.25 8 -9.631776 -.25 5.845344 -5.76 -.25 5.76
  [3,4,-18,-.25,8,-9.631776,-.25,5.845344,-5.76,-.25,5.76],
// 3 4 -18 -.25 8 -5.76 -.25 5.76 0 -.25 5.76
  [3,4,-18,-.25,8,-5.76,-.25,5.76,0,-.25,5.76],
// 4 4 5.76 -.25 5.76 18 -.25 8 -18 -.25 8 0 -.25 5.76
  [4,4,5.76,-.25,5.76,18,-.25,8,-18,-.25,8,0,-.25,5.76],
// 3 4 18 -.25 8 5.76 -.25 5.76 9.631776 -.25 5.845344
  [3,4,18,-.25,8,5.76,-.25,5.76,9.631776,-.25,5.845344],
// 3 4 18 -.25 8 9.631776 -.25 5.845344 16.32 -.25 5.76
  [3,4,18,-.25,8,9.631776,-.25,5.845344,16.32,-.25,5.76],
// 3 4 18 -.25 8 16.32 -.25 5.76 16.32 -.25 0
  [3,4,18,-.25,8,16.32,-.25,5.76,16.32,-.25,0],
// 4 4 16.32 -.25 0 16.32 -.25 -5.76 18 -.25 -8 18 -.25 8
  [4,4,16.32,-.25,0,16.32,-.25,-5.76,18,-.25,-8,18,-.25,8],
// 3 4 -18 -.25 -8 18 -.25 -8 16.32 -.25 -5.76
  [3,4,-18,-.25,-8,18,-.25,-8,16.32,-.25,-5.76],
// 3 4 16.32 -.25 -5.76 9.631776 -.25 -5.845344 -18 -.25 -8
  [3,4,16.32,-.25,-5.76,9.631776,-.25,-5.845344,-18,-.25,-8],
// 3 4 -18 -.25 -8 9.631776 -.25 -5.845344 5.76 -.25 -5.76
  [3,4,-18,-.25,-8,9.631776,-.25,-5.845344,5.76,-.25,-5.76],
// 3 4 5.76 -.25 -5.76 0 -.25 -5.76 -18 -.25 -8
  [3,4,5.76,-.25,-5.76,0,-.25,-5.76,-18,-.25,-8],
// 
// 3 4 -9.631776 -.25 -5.845344 -16.32 -.25 -5.76 -18 -.25 -8
  [3,4,-9.631776,-.25,-5.845344,-16.32,-.25,-5.76,-18,-.25,-8],
];
module ldraw_lib__4638848c(step=0, col=false, unit=2/5, alt=false, line=0.2, solid=!$preview)
    makepoly(ldraw_lib__4638848c(), step=step, col=col, unit=unit, alt=alt, line=line, solid=solid);
ldraw_lib__4638848c(line=0.2);
